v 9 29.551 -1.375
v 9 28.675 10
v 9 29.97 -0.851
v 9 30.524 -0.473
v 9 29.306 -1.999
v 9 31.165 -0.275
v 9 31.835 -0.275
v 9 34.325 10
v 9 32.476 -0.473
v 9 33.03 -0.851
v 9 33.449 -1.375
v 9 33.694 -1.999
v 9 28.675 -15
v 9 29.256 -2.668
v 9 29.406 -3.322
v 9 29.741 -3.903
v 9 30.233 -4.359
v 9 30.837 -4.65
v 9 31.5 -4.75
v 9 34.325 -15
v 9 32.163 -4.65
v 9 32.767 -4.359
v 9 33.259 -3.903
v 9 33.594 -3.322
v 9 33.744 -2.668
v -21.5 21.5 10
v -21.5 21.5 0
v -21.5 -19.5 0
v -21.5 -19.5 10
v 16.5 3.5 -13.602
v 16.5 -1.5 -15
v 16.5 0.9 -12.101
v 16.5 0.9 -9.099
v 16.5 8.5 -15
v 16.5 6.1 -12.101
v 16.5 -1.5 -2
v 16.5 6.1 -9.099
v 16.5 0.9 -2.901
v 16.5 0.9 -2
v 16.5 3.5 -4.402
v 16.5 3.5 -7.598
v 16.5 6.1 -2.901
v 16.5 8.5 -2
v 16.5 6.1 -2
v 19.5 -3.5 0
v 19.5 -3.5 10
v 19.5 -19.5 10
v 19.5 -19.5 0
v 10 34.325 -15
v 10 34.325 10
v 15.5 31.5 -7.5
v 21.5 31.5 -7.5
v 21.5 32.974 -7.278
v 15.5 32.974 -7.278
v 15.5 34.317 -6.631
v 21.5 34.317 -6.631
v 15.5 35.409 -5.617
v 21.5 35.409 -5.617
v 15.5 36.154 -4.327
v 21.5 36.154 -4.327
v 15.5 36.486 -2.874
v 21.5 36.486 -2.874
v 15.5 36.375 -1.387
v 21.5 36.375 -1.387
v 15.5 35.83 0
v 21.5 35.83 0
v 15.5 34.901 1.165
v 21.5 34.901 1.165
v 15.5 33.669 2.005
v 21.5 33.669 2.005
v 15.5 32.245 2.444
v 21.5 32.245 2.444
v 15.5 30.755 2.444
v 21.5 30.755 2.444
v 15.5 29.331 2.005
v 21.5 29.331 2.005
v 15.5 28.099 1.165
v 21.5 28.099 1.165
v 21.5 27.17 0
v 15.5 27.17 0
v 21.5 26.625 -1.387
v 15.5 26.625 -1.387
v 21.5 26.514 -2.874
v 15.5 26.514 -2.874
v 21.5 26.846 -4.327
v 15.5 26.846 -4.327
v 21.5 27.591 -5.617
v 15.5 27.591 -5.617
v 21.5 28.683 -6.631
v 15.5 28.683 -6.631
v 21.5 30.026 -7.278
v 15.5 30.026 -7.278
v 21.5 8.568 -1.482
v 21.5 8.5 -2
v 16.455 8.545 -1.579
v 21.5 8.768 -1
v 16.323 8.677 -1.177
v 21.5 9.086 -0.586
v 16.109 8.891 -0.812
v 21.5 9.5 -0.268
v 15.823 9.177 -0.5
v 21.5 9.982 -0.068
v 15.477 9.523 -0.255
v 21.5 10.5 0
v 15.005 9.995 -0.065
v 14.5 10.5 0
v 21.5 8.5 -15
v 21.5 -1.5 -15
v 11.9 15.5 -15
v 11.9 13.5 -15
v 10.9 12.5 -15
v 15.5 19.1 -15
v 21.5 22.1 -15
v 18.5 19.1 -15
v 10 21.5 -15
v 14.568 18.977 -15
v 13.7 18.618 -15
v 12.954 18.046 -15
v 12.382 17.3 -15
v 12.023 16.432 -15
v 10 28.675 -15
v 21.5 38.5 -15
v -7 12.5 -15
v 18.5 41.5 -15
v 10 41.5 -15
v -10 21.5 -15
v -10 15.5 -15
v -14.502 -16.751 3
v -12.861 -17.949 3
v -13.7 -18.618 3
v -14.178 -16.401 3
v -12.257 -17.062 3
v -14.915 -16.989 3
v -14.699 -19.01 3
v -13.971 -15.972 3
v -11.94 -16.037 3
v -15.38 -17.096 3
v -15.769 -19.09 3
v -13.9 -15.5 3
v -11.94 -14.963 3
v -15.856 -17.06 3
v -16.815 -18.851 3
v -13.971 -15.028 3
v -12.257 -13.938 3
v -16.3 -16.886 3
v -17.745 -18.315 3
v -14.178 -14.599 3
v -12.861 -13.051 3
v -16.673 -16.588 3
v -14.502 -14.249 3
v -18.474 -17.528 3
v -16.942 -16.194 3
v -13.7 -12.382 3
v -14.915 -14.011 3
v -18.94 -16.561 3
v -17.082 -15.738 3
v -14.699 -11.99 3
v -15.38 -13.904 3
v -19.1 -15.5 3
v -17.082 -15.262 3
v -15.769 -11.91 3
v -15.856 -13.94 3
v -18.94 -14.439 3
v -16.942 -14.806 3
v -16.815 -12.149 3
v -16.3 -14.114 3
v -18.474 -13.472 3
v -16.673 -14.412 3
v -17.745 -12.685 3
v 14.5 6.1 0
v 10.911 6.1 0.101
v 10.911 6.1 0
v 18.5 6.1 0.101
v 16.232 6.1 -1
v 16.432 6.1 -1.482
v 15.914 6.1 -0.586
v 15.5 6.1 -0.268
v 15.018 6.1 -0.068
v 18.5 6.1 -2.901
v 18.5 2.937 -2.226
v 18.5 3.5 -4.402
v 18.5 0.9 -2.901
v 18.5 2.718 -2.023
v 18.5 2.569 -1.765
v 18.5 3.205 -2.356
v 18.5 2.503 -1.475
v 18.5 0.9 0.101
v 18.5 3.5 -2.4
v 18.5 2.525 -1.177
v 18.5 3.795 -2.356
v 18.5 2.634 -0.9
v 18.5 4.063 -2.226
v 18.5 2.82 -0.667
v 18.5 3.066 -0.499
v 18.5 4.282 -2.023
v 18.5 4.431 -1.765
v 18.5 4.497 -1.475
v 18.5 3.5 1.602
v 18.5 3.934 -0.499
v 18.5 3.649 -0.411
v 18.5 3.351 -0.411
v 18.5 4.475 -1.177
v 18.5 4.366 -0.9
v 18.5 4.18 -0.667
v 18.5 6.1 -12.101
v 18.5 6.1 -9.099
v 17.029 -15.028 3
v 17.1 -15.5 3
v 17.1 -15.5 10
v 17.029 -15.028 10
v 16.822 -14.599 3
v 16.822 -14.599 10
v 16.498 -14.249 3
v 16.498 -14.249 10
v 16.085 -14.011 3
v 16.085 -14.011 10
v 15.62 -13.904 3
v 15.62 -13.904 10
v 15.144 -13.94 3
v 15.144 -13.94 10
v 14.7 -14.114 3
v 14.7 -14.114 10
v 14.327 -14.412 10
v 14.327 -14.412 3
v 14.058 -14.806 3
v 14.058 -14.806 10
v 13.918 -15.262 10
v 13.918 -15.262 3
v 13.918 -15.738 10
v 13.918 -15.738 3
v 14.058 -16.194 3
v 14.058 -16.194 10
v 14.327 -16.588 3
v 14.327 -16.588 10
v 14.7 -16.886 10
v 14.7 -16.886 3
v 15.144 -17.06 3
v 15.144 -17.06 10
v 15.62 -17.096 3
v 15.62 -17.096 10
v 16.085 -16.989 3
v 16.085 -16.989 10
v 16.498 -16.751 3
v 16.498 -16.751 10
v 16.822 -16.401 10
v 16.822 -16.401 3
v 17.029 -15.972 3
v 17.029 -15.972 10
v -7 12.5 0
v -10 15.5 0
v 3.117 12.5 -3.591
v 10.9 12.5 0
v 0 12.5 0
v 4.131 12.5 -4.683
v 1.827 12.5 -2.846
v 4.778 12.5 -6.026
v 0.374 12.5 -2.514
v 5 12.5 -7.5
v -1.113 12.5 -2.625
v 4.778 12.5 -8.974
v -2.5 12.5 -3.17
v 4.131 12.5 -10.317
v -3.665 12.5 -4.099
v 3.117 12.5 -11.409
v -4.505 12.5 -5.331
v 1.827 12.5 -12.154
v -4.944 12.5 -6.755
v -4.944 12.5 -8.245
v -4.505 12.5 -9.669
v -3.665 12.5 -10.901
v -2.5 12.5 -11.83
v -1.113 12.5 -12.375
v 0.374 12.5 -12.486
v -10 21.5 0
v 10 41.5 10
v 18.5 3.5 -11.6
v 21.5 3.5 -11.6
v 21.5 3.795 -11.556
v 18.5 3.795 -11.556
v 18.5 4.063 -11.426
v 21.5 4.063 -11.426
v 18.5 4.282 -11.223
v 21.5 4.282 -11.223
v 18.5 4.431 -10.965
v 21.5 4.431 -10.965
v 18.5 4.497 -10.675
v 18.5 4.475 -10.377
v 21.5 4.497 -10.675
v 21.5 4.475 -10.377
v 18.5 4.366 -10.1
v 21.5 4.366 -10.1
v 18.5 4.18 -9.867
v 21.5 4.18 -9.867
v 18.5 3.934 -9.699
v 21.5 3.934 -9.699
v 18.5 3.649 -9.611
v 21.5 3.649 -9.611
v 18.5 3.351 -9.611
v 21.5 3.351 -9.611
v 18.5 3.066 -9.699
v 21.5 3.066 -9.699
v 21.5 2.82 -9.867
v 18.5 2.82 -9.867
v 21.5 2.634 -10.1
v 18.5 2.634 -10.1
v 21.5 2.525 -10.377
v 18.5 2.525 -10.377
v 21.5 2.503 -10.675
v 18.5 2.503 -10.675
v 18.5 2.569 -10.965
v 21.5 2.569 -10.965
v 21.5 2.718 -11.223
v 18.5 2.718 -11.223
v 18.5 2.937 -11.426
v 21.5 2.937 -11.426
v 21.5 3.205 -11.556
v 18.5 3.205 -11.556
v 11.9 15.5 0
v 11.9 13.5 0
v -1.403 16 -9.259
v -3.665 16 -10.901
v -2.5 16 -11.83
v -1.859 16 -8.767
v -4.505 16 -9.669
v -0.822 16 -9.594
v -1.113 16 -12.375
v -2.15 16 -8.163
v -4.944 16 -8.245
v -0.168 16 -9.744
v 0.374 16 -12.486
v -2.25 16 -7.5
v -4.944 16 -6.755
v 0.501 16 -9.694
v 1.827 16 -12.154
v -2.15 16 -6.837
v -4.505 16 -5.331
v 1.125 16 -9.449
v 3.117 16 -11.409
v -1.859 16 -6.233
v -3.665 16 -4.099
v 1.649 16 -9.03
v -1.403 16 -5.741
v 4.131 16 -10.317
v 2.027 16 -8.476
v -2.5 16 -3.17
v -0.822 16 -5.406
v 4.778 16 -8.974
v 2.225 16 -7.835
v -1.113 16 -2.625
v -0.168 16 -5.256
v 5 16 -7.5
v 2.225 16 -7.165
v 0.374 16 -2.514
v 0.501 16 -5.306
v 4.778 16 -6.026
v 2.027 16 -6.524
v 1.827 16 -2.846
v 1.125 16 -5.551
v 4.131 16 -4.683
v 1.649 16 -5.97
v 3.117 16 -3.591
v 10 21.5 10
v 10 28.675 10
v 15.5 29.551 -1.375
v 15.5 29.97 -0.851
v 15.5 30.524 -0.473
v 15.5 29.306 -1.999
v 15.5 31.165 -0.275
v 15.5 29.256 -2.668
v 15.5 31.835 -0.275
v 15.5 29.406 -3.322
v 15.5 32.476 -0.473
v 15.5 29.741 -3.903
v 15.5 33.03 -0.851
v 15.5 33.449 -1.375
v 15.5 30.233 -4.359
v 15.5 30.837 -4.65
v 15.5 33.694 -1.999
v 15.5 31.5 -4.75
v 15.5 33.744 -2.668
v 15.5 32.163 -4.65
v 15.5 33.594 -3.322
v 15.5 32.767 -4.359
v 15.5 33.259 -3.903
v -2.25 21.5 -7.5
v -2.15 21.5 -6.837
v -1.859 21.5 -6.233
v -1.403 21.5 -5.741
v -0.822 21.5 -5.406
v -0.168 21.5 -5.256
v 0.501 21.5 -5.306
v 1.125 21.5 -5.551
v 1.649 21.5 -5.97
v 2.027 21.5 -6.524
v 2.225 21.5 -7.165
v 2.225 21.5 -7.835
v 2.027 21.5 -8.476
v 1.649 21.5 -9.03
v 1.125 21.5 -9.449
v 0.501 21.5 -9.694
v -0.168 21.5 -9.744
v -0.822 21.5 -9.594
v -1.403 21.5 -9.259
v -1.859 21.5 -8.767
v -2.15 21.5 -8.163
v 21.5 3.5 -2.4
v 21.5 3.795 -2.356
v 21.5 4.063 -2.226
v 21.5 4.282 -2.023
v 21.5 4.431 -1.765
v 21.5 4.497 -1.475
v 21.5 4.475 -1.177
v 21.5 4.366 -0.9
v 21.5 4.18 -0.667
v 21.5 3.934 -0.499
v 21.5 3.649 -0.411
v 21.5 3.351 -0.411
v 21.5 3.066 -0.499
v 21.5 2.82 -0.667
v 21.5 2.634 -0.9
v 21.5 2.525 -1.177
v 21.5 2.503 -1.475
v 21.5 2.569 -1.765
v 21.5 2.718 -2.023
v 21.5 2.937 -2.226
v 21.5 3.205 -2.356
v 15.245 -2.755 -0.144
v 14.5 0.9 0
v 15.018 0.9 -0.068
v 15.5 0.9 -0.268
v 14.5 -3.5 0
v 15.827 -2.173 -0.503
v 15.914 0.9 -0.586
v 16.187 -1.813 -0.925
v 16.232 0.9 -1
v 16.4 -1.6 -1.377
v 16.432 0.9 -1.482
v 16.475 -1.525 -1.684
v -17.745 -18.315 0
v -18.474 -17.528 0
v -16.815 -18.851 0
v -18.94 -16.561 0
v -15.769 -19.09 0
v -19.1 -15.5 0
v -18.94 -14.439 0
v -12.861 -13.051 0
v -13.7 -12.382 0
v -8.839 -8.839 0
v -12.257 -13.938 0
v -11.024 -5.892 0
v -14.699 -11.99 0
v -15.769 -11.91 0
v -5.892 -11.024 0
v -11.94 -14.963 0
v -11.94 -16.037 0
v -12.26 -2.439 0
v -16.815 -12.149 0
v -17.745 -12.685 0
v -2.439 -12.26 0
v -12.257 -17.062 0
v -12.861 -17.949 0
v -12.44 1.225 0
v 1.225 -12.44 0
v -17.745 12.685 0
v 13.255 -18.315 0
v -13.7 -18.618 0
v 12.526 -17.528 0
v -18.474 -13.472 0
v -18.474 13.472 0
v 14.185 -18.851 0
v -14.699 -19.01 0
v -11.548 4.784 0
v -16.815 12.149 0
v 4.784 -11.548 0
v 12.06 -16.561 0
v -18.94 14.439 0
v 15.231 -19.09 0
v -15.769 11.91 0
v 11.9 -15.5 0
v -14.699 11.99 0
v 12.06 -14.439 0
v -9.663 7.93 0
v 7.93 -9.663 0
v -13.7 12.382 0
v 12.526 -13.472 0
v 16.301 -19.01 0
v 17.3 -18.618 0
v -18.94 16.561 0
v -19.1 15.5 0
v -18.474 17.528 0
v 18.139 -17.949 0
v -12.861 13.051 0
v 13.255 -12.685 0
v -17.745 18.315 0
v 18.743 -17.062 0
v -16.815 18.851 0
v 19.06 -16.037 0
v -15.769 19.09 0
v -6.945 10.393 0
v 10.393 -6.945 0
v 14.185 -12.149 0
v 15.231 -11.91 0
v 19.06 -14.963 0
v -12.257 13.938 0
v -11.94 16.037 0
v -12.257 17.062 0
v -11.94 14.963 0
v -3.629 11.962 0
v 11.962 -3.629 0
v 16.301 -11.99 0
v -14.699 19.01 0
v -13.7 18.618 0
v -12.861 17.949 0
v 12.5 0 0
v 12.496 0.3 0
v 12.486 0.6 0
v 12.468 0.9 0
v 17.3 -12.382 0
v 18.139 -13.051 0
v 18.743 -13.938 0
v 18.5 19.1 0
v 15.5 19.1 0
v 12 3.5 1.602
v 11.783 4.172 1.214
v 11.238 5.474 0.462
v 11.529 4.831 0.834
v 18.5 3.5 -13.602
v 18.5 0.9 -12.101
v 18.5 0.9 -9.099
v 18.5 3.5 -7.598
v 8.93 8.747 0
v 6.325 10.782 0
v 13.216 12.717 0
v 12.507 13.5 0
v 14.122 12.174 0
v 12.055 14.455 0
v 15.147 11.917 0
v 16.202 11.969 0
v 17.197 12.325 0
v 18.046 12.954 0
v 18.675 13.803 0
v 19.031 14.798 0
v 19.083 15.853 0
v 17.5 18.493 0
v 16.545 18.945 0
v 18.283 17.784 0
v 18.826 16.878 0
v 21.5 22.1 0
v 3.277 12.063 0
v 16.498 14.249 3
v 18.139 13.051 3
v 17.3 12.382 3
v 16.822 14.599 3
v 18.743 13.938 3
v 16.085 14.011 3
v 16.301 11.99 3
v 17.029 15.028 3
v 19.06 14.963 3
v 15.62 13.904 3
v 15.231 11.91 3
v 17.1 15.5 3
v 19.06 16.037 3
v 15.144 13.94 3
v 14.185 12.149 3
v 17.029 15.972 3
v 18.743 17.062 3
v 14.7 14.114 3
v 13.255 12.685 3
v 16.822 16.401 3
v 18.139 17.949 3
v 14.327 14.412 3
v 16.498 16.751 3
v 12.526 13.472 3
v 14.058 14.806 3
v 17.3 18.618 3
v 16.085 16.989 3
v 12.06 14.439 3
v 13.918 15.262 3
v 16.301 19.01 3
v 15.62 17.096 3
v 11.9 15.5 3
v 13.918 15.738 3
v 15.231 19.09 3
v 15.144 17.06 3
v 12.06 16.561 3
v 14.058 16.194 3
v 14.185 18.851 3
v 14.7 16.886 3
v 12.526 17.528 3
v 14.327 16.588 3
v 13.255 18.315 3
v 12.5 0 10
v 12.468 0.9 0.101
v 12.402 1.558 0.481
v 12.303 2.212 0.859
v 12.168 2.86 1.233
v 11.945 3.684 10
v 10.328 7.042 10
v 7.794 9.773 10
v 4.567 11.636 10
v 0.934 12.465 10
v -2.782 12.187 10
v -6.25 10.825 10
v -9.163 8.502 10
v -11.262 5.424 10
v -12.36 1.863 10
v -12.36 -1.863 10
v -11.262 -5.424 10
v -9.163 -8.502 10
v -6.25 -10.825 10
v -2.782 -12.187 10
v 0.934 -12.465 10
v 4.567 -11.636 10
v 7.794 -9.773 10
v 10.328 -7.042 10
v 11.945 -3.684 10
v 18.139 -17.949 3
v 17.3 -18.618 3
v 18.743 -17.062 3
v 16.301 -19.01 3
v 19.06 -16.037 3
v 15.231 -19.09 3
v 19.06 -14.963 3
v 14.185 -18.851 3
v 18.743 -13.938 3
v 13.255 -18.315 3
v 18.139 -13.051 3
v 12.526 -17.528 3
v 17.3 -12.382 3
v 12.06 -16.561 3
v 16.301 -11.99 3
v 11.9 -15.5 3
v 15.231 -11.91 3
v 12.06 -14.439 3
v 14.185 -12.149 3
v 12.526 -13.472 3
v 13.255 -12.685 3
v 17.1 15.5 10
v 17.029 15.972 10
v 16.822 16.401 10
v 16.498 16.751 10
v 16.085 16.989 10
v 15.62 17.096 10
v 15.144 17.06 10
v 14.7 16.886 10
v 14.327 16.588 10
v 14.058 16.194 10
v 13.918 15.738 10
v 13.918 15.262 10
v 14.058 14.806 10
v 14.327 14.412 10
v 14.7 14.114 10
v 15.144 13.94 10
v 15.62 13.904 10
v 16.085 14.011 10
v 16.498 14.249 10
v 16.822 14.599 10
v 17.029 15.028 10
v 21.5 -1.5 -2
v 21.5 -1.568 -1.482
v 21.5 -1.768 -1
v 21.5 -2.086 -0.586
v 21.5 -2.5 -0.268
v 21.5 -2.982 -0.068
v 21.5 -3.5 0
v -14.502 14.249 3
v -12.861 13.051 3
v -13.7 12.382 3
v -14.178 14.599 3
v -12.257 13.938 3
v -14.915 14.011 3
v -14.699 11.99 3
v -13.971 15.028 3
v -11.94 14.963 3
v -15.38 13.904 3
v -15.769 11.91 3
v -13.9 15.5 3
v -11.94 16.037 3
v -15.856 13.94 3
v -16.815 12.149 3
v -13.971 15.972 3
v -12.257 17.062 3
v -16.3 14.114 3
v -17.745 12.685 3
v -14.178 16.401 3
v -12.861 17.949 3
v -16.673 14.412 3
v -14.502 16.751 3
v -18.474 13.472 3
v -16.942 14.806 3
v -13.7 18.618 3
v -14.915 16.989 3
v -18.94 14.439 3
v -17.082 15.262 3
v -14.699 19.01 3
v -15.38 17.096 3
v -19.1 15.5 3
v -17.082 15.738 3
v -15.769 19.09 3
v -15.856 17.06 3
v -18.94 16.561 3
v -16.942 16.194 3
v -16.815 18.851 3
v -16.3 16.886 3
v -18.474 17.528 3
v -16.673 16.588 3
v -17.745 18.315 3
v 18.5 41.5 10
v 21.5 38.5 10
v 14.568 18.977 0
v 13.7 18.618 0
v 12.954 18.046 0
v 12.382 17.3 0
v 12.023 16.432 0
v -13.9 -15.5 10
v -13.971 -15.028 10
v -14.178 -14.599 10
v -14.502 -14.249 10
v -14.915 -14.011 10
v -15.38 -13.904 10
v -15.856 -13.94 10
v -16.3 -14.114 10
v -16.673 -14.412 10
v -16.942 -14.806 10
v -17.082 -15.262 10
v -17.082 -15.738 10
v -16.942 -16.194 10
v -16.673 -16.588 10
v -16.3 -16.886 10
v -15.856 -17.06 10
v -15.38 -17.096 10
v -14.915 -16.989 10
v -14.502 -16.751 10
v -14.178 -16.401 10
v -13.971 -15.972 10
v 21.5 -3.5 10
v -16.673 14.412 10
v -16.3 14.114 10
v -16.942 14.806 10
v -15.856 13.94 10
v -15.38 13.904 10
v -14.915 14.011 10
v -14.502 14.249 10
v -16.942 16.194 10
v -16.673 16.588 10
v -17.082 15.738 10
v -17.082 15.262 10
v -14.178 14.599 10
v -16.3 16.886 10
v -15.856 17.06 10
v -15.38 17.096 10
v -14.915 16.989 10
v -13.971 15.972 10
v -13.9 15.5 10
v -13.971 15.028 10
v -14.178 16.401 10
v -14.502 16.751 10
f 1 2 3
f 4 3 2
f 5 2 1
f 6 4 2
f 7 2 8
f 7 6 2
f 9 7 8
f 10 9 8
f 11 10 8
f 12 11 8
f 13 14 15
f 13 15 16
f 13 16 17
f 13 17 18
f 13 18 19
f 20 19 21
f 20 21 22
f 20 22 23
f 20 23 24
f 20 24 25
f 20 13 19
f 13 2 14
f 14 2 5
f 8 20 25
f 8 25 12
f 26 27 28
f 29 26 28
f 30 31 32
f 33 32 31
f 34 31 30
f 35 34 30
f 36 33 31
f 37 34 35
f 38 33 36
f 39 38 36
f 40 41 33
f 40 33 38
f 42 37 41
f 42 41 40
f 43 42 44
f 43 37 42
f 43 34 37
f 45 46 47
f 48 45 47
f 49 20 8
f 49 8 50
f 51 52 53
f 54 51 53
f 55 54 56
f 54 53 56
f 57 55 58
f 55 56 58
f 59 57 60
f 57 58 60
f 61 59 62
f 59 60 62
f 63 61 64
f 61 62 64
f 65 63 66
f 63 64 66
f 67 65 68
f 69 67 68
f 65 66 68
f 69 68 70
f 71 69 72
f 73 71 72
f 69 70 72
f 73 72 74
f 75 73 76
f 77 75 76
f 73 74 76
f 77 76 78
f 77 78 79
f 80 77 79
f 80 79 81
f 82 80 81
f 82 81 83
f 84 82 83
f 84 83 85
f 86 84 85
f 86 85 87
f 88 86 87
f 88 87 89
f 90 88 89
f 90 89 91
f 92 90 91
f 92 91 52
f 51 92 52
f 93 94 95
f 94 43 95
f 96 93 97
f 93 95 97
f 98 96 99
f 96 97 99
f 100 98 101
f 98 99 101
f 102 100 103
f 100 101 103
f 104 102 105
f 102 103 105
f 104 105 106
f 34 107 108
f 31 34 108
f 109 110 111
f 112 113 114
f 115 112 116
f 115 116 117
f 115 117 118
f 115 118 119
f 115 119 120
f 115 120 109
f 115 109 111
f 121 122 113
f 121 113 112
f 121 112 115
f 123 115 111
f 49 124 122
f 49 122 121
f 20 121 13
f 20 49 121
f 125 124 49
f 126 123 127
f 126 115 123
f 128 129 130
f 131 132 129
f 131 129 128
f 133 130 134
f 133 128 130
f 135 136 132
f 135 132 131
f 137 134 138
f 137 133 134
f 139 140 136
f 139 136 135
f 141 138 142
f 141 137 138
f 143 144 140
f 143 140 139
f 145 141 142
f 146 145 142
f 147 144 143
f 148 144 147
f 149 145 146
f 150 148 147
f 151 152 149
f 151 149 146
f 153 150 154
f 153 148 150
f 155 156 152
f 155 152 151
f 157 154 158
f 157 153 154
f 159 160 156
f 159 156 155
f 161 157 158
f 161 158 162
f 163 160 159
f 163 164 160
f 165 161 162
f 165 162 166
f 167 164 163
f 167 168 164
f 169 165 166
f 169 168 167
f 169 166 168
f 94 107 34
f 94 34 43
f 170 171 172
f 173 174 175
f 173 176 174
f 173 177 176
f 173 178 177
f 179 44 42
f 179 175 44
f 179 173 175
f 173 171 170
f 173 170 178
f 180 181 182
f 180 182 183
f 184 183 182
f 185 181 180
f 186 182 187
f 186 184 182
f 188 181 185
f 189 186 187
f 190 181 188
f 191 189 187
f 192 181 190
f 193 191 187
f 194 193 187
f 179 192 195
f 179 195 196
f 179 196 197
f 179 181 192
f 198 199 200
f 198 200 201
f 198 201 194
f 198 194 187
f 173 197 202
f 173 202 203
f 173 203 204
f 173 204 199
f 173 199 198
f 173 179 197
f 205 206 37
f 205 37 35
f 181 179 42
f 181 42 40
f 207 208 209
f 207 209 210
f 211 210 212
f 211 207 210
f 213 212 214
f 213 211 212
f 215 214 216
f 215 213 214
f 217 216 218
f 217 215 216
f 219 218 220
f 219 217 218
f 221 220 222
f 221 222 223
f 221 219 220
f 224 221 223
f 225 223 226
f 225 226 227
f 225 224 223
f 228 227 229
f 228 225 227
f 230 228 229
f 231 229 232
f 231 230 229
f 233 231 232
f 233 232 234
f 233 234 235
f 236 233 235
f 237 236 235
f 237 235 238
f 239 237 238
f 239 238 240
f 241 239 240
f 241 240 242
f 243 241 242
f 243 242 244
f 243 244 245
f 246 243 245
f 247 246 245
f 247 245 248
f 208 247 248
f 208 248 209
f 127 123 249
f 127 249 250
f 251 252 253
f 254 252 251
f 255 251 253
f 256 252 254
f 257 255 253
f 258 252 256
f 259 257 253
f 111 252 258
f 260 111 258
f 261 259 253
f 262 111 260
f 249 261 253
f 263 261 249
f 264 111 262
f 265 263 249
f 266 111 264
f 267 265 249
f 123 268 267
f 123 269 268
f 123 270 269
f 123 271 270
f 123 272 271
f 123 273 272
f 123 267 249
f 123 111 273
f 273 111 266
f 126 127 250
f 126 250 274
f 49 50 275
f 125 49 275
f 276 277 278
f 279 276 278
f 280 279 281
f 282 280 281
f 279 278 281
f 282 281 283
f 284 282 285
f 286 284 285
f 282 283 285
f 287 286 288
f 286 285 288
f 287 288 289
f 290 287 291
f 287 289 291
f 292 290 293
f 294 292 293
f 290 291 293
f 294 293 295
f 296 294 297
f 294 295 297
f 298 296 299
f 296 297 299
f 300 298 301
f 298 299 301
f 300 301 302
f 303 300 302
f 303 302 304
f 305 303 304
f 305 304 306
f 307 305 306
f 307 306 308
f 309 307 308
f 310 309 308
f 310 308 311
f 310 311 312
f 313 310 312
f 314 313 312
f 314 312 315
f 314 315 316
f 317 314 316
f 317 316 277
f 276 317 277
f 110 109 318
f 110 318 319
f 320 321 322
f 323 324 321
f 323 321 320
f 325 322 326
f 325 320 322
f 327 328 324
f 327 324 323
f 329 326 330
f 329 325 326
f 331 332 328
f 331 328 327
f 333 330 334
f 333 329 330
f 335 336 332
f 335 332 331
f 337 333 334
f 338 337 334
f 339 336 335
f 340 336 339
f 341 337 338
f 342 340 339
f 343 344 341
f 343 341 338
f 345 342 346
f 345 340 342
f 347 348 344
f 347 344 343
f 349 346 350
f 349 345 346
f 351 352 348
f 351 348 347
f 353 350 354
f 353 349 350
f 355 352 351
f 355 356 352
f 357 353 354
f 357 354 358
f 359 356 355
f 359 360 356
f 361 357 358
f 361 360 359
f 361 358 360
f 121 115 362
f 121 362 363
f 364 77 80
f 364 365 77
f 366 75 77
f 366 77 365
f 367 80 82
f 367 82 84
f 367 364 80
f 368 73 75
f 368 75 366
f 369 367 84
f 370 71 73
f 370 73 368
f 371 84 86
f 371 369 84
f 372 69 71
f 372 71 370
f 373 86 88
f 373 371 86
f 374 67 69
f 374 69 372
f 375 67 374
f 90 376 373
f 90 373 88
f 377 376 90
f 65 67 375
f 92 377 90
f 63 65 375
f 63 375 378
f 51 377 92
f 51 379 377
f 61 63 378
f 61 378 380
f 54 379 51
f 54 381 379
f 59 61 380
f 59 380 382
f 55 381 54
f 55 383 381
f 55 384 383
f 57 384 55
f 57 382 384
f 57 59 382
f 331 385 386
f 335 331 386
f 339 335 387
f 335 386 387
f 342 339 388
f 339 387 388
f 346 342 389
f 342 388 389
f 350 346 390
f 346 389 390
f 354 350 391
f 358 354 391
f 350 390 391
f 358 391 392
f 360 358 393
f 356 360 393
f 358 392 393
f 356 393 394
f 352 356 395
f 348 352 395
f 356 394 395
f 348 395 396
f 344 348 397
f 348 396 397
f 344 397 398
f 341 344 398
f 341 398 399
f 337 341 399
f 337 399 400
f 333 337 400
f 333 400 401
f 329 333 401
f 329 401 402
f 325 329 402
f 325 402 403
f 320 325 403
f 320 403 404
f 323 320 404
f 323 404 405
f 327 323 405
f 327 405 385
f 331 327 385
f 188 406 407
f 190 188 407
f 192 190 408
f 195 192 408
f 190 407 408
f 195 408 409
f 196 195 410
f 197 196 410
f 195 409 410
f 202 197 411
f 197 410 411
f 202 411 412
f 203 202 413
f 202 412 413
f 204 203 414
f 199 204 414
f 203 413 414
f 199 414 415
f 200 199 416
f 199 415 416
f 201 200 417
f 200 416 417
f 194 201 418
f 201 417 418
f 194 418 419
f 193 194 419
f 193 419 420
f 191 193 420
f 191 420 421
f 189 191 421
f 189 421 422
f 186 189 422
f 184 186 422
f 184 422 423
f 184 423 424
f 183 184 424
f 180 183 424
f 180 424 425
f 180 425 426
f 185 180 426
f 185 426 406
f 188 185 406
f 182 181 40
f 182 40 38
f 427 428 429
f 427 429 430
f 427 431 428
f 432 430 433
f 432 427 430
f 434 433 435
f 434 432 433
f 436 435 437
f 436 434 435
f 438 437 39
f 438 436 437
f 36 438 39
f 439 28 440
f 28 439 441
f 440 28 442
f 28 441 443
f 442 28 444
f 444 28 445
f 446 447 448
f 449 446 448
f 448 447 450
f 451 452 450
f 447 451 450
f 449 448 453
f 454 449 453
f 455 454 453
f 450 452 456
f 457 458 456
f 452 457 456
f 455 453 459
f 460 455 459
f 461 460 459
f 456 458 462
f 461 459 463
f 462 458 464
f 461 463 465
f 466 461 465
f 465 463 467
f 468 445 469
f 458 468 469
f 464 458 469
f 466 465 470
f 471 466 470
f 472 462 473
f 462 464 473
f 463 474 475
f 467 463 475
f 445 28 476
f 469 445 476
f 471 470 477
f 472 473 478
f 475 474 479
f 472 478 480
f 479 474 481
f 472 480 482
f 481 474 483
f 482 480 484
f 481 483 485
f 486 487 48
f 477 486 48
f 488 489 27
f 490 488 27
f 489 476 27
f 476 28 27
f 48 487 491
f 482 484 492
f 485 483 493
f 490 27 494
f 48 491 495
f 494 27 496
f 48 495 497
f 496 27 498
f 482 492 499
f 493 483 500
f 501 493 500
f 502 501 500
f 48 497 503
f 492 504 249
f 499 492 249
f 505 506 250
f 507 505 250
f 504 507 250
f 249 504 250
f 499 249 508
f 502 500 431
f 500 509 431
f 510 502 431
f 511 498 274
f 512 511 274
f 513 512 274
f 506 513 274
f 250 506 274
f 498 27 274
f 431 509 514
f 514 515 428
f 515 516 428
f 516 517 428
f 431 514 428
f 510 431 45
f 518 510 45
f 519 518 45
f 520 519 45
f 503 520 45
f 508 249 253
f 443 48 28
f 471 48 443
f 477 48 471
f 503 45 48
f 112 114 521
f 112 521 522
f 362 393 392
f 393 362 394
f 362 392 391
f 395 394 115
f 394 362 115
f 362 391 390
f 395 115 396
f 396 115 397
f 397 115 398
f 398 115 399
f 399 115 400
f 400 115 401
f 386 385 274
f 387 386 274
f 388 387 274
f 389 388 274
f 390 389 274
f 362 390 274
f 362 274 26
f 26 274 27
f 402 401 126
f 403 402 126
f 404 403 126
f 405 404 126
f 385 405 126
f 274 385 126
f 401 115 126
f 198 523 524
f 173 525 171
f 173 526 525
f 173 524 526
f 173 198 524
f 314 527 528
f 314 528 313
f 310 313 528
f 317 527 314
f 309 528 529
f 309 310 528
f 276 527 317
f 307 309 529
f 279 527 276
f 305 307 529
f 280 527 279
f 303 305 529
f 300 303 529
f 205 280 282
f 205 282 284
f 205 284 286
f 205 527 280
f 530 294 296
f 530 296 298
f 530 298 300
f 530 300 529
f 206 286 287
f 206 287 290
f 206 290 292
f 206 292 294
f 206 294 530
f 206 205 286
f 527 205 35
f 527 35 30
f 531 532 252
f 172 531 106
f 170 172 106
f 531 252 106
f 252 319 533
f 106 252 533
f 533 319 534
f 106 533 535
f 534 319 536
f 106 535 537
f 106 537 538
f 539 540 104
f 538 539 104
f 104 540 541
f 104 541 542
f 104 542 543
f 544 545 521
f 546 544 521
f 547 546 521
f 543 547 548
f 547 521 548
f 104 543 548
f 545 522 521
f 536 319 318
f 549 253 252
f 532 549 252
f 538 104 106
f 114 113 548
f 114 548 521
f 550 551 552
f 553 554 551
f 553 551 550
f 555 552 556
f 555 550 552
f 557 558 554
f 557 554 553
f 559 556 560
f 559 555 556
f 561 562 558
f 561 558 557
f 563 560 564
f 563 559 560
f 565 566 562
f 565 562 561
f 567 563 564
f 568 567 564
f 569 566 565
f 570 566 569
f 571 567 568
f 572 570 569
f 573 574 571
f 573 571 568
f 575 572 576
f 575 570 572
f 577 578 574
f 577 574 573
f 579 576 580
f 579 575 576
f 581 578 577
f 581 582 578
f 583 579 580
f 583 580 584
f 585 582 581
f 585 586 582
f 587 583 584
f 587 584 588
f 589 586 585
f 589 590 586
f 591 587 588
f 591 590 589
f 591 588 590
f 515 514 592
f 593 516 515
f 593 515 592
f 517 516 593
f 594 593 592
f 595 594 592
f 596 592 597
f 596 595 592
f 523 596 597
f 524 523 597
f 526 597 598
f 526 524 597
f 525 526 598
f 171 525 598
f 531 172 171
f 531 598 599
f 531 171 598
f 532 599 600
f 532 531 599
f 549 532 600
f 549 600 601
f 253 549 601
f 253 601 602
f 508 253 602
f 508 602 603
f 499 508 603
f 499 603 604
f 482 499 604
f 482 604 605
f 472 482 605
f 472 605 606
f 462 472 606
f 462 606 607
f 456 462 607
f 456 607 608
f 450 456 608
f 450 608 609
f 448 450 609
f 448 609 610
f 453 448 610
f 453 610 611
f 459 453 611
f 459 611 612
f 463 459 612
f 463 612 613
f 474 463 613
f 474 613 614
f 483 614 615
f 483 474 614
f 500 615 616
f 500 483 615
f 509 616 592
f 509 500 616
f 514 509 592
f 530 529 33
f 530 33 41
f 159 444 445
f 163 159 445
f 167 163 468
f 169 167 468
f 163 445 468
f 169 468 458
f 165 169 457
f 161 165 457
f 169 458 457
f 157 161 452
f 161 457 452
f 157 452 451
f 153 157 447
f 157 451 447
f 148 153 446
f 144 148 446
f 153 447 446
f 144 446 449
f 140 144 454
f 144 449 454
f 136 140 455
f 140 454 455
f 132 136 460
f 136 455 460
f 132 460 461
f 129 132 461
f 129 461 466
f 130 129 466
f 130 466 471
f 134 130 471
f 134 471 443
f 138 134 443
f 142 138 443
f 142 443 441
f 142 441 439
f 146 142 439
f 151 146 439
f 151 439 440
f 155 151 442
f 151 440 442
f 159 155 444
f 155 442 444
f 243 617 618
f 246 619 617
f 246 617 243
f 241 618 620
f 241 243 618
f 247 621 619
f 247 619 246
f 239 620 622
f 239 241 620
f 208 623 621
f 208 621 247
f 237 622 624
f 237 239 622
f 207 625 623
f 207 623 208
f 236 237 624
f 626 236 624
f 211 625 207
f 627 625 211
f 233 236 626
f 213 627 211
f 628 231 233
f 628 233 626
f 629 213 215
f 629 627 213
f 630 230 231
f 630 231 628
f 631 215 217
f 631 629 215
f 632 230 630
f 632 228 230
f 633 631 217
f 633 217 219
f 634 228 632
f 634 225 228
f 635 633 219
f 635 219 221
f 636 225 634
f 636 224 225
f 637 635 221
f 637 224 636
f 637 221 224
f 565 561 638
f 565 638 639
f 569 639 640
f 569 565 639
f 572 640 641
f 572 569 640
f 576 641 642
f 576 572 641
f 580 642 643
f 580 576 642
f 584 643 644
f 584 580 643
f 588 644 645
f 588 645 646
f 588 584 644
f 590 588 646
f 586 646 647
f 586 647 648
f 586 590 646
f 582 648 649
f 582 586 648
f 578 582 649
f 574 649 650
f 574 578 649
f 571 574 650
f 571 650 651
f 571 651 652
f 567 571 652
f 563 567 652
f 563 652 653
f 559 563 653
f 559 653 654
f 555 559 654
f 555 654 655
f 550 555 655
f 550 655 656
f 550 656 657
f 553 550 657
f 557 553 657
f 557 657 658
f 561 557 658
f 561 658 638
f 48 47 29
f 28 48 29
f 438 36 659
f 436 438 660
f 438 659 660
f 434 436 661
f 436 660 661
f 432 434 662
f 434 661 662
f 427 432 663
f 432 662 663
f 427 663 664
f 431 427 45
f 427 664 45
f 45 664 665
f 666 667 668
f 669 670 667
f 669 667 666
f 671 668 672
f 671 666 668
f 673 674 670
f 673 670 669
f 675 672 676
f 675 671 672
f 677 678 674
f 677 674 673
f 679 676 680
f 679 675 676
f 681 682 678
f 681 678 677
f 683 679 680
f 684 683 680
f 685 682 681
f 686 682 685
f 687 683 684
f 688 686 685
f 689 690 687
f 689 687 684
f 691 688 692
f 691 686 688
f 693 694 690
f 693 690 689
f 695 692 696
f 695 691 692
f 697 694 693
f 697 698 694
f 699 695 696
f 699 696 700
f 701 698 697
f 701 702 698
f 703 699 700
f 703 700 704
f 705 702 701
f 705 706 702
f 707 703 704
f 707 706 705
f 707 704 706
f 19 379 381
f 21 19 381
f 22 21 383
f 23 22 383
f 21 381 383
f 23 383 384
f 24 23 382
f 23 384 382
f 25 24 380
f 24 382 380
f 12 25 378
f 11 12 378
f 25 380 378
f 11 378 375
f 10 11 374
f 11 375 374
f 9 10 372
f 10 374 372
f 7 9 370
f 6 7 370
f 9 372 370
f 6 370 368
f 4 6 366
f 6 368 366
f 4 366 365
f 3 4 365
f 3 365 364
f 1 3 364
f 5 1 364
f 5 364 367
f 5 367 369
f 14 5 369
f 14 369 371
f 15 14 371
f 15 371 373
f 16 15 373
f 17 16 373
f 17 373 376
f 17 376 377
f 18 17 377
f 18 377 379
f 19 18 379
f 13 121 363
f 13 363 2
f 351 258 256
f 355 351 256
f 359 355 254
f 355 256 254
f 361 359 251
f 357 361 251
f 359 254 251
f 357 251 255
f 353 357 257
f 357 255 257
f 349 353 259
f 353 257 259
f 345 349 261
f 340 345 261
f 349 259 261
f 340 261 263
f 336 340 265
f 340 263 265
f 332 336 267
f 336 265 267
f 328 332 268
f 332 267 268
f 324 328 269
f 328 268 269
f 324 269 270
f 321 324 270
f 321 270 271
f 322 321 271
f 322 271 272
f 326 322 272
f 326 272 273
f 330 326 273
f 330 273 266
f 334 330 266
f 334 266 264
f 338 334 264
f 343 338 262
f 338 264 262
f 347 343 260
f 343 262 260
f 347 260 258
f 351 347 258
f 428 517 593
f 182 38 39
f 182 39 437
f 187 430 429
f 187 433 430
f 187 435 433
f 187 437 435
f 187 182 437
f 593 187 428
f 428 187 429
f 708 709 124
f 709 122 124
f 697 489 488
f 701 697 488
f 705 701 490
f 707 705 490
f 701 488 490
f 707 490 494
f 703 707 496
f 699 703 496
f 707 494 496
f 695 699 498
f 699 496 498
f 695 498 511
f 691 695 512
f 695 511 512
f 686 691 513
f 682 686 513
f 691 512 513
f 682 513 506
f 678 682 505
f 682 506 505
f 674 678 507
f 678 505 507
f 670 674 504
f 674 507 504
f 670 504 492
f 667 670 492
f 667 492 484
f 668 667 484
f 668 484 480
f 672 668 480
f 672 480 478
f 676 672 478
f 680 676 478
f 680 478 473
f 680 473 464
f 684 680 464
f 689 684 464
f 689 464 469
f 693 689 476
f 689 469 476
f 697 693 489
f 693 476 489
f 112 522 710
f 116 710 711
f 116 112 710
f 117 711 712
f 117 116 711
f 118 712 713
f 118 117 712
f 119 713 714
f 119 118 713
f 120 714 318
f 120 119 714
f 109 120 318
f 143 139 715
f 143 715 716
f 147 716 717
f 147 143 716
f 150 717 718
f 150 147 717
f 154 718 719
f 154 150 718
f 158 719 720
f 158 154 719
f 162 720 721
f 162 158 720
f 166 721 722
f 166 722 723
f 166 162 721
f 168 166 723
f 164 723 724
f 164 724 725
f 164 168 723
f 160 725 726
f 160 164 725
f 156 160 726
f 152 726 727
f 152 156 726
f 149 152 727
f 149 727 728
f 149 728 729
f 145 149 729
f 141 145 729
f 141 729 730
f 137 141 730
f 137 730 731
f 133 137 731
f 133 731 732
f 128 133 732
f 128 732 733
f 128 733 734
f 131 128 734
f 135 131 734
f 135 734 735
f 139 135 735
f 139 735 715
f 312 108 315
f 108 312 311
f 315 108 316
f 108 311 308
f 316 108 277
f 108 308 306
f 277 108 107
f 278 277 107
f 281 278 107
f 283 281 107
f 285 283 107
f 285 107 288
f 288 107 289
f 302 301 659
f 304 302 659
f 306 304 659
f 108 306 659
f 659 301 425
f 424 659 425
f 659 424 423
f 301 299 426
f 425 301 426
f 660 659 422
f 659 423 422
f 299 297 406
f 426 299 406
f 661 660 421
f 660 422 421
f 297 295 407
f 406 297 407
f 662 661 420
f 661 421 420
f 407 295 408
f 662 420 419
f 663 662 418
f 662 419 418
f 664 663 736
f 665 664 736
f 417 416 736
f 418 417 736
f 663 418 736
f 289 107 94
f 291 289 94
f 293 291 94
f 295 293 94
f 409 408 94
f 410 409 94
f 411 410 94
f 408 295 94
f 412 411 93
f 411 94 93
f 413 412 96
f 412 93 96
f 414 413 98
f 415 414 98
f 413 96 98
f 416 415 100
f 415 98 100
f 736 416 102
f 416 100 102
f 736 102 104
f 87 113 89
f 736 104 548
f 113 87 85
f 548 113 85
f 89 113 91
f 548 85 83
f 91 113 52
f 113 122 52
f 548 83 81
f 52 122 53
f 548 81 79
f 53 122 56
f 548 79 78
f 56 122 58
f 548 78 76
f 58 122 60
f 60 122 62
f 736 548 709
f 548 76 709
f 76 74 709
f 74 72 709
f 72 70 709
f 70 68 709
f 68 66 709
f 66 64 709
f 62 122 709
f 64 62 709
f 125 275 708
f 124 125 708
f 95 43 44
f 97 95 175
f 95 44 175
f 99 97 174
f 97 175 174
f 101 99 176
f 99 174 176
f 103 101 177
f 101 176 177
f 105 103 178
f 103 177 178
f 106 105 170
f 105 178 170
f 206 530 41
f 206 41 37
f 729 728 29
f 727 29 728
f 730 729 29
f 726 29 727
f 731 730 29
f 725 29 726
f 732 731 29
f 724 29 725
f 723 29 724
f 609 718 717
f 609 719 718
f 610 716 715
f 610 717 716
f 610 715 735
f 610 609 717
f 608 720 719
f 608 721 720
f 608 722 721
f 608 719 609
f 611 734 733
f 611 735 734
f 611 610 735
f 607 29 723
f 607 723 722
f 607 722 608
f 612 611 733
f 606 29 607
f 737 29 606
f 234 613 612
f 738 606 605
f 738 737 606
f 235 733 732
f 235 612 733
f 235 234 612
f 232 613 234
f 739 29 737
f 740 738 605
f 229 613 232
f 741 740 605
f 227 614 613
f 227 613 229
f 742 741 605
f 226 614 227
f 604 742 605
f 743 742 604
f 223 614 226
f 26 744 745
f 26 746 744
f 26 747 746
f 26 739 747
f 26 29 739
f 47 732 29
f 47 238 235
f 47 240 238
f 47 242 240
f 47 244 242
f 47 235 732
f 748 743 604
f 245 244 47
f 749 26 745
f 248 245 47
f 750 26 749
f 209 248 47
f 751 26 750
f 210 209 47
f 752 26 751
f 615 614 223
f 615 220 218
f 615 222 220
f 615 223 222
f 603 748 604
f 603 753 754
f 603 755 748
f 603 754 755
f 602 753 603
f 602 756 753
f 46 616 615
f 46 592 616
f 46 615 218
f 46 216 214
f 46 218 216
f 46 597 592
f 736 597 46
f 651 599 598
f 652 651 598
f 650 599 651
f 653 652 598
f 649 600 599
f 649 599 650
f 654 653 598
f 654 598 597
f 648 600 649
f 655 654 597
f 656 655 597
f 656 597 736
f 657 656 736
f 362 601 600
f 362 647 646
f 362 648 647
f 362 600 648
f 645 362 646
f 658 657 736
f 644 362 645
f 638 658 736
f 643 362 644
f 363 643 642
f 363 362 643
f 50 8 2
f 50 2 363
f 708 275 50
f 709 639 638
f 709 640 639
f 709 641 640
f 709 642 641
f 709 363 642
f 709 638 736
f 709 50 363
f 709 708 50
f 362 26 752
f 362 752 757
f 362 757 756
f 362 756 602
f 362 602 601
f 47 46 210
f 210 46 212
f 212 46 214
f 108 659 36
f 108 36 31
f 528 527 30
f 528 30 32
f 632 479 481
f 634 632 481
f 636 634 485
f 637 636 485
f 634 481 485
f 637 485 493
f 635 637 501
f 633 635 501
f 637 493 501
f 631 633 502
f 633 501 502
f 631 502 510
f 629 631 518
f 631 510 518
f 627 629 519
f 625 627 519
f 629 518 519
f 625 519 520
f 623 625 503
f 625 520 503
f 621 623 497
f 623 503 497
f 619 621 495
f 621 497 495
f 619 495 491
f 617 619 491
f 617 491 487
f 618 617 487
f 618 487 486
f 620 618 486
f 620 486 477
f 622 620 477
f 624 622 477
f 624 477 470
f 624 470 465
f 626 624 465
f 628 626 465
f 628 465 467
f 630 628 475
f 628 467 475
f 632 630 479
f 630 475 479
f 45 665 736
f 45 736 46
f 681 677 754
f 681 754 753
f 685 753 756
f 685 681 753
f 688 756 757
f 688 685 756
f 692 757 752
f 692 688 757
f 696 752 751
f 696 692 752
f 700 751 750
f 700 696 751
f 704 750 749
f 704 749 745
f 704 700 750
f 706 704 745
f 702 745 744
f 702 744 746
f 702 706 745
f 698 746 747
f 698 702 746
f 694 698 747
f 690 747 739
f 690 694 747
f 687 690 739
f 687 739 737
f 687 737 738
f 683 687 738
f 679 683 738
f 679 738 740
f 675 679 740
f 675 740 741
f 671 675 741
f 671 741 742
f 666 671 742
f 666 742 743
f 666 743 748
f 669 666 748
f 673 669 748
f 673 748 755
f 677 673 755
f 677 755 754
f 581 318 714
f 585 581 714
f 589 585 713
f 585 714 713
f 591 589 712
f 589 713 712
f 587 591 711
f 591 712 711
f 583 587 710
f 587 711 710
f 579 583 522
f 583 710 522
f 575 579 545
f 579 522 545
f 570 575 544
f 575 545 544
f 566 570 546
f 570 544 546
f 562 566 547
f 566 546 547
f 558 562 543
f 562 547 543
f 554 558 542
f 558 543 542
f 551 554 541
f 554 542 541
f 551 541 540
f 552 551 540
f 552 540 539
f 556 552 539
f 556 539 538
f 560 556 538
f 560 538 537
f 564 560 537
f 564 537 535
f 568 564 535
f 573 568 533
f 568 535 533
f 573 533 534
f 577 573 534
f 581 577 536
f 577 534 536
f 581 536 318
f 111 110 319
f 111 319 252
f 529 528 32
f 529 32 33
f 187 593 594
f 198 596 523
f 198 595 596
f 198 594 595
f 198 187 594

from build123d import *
from build123d.topology import SkipClean

# Parameters (mm, degrees)
ESBO_O1_R                  = 12.5
ESBO_O1_R_2                = 1.6
RESSALTO_EXTRUS_O1_DEPTH   = 10
ESBO_O3_R                  = 3.6
CORTE_EXTRUS_O1_DEPTH      = 3
RESSALTO_EXTRUS_O2_START   = 15
RESSALTO_EXTRUS_O2_DEPTH   = 15
ESBO_O4_R                  = 2.25
CORTE_EXTRUS_O2_DEPTH      = 62.613715961
ESBO_O5_R                  = 2.25
CORTE_EXTRUS_O3_DEPTH      = 51.361196938
ESBO_O6_R                  = 5
CORTE_EXTRUS_O4_DEPTH      = 3.5
ESBO_O7_R                  = 5
CORTE_EXTRUS_O5_DEPTH      = 6
ESBO_O8_R                  = 1
RESSALTO_EXTRUS_O3_DEPTH   = 5
CORTE_EXTRUS_O7_DEPTH      = 10
CORTE_EXTRUS_O7_DEPTH_BACK = 2
FILETE1_R                  = 2
CORTE_EXTRUS_O8_DEPTH      = 50.08665705
CORTE_EXTRUS_O8_DEPTH_BACK = 50.08665705


with BuildPart() as part:
    # Esboço1 → Ressalto-extrusão1 (new body)
    with BuildSketch(Plane.XY):
        Polygon((-21.50000073, 21.50000073), (-21.50000073, -21.50000073), (21.50000073, -21.50000073), (21.50000073, 38.499999791), (18.500000238, 41.49999842), (9.999999776, 41.49999842), (9.999999776, 34.324999575), (8.999999613, 34.324999575), (8.999999613, 28.674999575), (9.999999776, 28.674999575), (9.999999776, 21.50000073), align=None)
        Circle(ESBO_O1_R, mode=Mode.SUBTRACT)
        with Locations((-15.5, 15.5)):
            Circle(ESBO_O1_R_2, mode=Mode.SUBTRACT)
        with Locations((15.5, 15.5)):
            Circle(ESBO_O1_R_2, mode=Mode.SUBTRACT)
        with Locations((15.5, -15.5)):
            Circle(ESBO_O1_R_2, mode=Mode.SUBTRACT)
        with Locations((-15.5, -15.5)):
            Circle(ESBO_O1_R_2, mode=Mode.SUBTRACT)
    extrude(amount=RESSALTO_EXTRUS_O1_DEPTH)

    # Esboço3 → Corte-extrusão1 (cut)
    with BuildSketch(Plane(origin=(0, 0, 0), x_dir=(-1, 0, 0), z_dir=(0, 0, -1))):
        with Locations((-15.5, 15.5)):
            Circle(ESBO_O3_R)
        with Locations((15.5, 15.5)):
            Circle(ESBO_O3_R)
        with Locations((15.5, -15.5)):
            Circle(ESBO_O3_R)
        with Locations((-15.5, -15.5)):
            Circle(ESBO_O3_R)
    extrude(amount=-CORTE_EXTRUS_O1_DEPTH, mode=Mode.SUBTRACT)

    # Esboço2 → Ressalto-extrusão2 (add)
    with SkipClean():  # the faces are left unmerged after this step: merging them gives an invalid solid
        with BuildSketch(Plane(origin=(0, 0, 0), x_dir=(-1, 0, 0), z_dir=(0, 0, -1)).offset(RESSALTO_EXTRUS_O2_START)):
            with BuildLine():
                Line((-18.500000238, 41.49999842), (-21.50000073, 38.499999791))
                Line((-21.50000073, 38.499999791), (-21.50000073, 22.1))
                Line((-21.50000073, 22.1), (-18.50000073, 19.1))
                Line((-18.50000073, 19.1), (-15.5, 19.1))
                ThreePointArc((-15.5, 19.1), (-12.954415588, 18.045584412), (-11.9, 15.5))
                Line((-11.9, 15.5), (-11.9, 13.5))
                Line((-11.9, 13.5), (-10.9, 12.5))
                Line((-10.9, 12.5), (6.99999927, 12.5))
                Line((6.99999927, 12.5), (9.99999927, 15.5))
                Line((9.99999927, 15.5), (9.99999927, 21.50000073))
                Line((9.99999927, 21.50000073), (-9.999999776, 21.50000073))
                Line((-9.999999776, 21.50000073), (-9.999999776, 28.674999575))
                Line((-9.999999776, 28.674999575), (-8.999999613, 28.674999575))
                Line((-8.999999613, 28.674999575), (-8.999999613, 34.324999575))
                Line((-8.999999613, 34.324999575), (-9.999999776, 34.324999575))
                Line((-9.999999776, 34.324999575), (-9.999999776, 41.49999842))
                Line((-9.999999776, 41.49999842), (-18.500000238, 41.49999842))
            make_face()
        extrude(amount=-RESSALTO_EXTRUS_O2_DEPTH)

    # Esboço4 → Corte-extrusão2 (cut, through all)
    with SkipClean():  # the faces are left unmerged after this step: merging them gives an invalid solid
        with BuildSketch(Plane(origin=(21.50000073, 0, 0), x_dir=(0, 0, -1), z_dir=(1, 0, 0))):
            with Locations((2.5, 31.49999842)):
                Circle(ESBO_O4_R)
        extrude(amount=-CORTE_EXTRUS_O2_DEPTH, mode=Mode.SUBTRACT)

    # Esboço5 → Corte-extrusão3 (cut, through all)
    with SkipClean():  # the faces are left unmerged after this step: merging them gives an invalid solid
        with BuildSketch(Plane(origin=(0, 21.50000073, 0), x_dir=(1, 0, 0), z_dir=(0, 1, 0))):
            with Locations(Location((0, 7.5, 0), (0, 0, 180))):
                Circle(ESBO_O5_R)
        extrude(amount=-CORTE_EXTRUS_O3_DEPTH, mode=Mode.SUBTRACT)

    # Esboço6 → Corte-extrusão4 (cut)
    with SkipClean():  # the faces are left unmerged after this step: merging them gives an invalid solid
        with BuildSketch(Plane.XZ.offset(-12.5)):
            with Locations((0, -7.5)):
                Circle(ESBO_O6_R)
        extrude(amount=-CORTE_EXTRUS_O4_DEPTH, mode=Mode.SUBTRACT)

    # Esboço7 → Corte-extrusão5 (cut)
    with SkipClean():  # the faces are left unmerged after this step: merging them gives an invalid solid
        with BuildSketch(Plane(origin=(21.50000073, 0, 0), x_dir=(0, 0, -1), z_dir=(1, 0, 0))):
            with Locations((2.5, 31.49999842)):
                Circle(ESBO_O7_R)
        extrude(amount=-CORTE_EXTRUS_O5_DEPTH, mode=Mode.SUBTRACT)

    # Esboço8 → Ressalto-extrusão3 (add)
    with SkipClean():  # the faces are left unmerged after this step: merging them gives an invalid solid
        with BuildSketch(Plane(origin=(21.50000073, 0, 0), x_dir=(0, 0, -1), z_dir=(1, 0, 0))):
            Polygon((0, 8.49999927), (15, 8.49999927), (15, -1.50000073), (0, -1.50000073), (-2, -1.50000073), (-2, 8.49999927), align=None)
            with Locations((1.4, 3.49999927)):
                Circle(ESBO_O8_R, mode=Mode.SUBTRACT)
            with Locations((10.6, 3.49999927)):
                Circle(ESBO_O8_R, mode=Mode.SUBTRACT)
        extrude(amount=-RESSALTO_EXTRUS_O3_DEPTH)

    # Esboço9 → Corte-extrusão7 (cut, two sides: drawn at the far end of the back side and taken through both)
    with BuildSketch(Plane.ZY.offset(-16.50000073).offset(-CORTE_EXTRUS_O7_DEPTH_BACK)):
        Polygon((-9.0988893, 0.89999927), (-7.5977786, 3.49999927), (-9.0988893, 6.09999927), (-12.1011107, 6.09999927), (-13.6022214, 3.49999927), (-12.1011107, 0.89999927), align=None)
        Polygon((-4.4022214, 3.49999927), (-2.9011107, 0.89999927), (0.1011107, 0.89999927), (1.6022214, 3.49999927), (0.1011107, 6.09999927), (-2.9011107, 6.09999927), align=None)
    extrude(amount=CORTE_EXTRUS_O7_DEPTH + CORTE_EXTRUS_O7_DEPTH_BACK, mode=Mode.SUBTRACT)

    # Filete1
    filete1_edges = [part.edges().sort_by_distance(p)[0] for p in [
        (16.50000073, -0.30000073, 0),
        (19.00000073, 8.49999927, 0),
        (19.00000073, -1.50000073, 0),
        (16.50000073, 7.29999927, 0),
    ]]
    fillet(filete1_edges, radius=FILETE1_R)

    # Esboço10 → Corte-extrusão8 (cut, two sides: drawn at the far end of the back side and taken through both)
    with SkipClean():  # the faces are left unmerged after this step: merging them gives an invalid solid
        with BuildSketch(Plane(origin=(0, 0, 0), x_dir=(-1, 0, 0), z_dir=(0, 0, -1)).offset(-CORTE_EXTRUS_O8_DEPTH_BACK)):
            Polygon((-21.50000073, -3.50000073), (-19.50000073, -3.50000073), (-19.50000073, -19.50000073), (21.50000073, -19.50000073), (21.50000073, -21.50000073), (-19.50000073, -21.50000073), (-21.50000073, -21.50000073), align=None)
        extrude(amount=CORTE_EXTRUS_O8_DEPTH + CORTE_EXTRUS_O8_DEPTH_BACK, mode=Mode.SUBTRACT)


solid = part.part
